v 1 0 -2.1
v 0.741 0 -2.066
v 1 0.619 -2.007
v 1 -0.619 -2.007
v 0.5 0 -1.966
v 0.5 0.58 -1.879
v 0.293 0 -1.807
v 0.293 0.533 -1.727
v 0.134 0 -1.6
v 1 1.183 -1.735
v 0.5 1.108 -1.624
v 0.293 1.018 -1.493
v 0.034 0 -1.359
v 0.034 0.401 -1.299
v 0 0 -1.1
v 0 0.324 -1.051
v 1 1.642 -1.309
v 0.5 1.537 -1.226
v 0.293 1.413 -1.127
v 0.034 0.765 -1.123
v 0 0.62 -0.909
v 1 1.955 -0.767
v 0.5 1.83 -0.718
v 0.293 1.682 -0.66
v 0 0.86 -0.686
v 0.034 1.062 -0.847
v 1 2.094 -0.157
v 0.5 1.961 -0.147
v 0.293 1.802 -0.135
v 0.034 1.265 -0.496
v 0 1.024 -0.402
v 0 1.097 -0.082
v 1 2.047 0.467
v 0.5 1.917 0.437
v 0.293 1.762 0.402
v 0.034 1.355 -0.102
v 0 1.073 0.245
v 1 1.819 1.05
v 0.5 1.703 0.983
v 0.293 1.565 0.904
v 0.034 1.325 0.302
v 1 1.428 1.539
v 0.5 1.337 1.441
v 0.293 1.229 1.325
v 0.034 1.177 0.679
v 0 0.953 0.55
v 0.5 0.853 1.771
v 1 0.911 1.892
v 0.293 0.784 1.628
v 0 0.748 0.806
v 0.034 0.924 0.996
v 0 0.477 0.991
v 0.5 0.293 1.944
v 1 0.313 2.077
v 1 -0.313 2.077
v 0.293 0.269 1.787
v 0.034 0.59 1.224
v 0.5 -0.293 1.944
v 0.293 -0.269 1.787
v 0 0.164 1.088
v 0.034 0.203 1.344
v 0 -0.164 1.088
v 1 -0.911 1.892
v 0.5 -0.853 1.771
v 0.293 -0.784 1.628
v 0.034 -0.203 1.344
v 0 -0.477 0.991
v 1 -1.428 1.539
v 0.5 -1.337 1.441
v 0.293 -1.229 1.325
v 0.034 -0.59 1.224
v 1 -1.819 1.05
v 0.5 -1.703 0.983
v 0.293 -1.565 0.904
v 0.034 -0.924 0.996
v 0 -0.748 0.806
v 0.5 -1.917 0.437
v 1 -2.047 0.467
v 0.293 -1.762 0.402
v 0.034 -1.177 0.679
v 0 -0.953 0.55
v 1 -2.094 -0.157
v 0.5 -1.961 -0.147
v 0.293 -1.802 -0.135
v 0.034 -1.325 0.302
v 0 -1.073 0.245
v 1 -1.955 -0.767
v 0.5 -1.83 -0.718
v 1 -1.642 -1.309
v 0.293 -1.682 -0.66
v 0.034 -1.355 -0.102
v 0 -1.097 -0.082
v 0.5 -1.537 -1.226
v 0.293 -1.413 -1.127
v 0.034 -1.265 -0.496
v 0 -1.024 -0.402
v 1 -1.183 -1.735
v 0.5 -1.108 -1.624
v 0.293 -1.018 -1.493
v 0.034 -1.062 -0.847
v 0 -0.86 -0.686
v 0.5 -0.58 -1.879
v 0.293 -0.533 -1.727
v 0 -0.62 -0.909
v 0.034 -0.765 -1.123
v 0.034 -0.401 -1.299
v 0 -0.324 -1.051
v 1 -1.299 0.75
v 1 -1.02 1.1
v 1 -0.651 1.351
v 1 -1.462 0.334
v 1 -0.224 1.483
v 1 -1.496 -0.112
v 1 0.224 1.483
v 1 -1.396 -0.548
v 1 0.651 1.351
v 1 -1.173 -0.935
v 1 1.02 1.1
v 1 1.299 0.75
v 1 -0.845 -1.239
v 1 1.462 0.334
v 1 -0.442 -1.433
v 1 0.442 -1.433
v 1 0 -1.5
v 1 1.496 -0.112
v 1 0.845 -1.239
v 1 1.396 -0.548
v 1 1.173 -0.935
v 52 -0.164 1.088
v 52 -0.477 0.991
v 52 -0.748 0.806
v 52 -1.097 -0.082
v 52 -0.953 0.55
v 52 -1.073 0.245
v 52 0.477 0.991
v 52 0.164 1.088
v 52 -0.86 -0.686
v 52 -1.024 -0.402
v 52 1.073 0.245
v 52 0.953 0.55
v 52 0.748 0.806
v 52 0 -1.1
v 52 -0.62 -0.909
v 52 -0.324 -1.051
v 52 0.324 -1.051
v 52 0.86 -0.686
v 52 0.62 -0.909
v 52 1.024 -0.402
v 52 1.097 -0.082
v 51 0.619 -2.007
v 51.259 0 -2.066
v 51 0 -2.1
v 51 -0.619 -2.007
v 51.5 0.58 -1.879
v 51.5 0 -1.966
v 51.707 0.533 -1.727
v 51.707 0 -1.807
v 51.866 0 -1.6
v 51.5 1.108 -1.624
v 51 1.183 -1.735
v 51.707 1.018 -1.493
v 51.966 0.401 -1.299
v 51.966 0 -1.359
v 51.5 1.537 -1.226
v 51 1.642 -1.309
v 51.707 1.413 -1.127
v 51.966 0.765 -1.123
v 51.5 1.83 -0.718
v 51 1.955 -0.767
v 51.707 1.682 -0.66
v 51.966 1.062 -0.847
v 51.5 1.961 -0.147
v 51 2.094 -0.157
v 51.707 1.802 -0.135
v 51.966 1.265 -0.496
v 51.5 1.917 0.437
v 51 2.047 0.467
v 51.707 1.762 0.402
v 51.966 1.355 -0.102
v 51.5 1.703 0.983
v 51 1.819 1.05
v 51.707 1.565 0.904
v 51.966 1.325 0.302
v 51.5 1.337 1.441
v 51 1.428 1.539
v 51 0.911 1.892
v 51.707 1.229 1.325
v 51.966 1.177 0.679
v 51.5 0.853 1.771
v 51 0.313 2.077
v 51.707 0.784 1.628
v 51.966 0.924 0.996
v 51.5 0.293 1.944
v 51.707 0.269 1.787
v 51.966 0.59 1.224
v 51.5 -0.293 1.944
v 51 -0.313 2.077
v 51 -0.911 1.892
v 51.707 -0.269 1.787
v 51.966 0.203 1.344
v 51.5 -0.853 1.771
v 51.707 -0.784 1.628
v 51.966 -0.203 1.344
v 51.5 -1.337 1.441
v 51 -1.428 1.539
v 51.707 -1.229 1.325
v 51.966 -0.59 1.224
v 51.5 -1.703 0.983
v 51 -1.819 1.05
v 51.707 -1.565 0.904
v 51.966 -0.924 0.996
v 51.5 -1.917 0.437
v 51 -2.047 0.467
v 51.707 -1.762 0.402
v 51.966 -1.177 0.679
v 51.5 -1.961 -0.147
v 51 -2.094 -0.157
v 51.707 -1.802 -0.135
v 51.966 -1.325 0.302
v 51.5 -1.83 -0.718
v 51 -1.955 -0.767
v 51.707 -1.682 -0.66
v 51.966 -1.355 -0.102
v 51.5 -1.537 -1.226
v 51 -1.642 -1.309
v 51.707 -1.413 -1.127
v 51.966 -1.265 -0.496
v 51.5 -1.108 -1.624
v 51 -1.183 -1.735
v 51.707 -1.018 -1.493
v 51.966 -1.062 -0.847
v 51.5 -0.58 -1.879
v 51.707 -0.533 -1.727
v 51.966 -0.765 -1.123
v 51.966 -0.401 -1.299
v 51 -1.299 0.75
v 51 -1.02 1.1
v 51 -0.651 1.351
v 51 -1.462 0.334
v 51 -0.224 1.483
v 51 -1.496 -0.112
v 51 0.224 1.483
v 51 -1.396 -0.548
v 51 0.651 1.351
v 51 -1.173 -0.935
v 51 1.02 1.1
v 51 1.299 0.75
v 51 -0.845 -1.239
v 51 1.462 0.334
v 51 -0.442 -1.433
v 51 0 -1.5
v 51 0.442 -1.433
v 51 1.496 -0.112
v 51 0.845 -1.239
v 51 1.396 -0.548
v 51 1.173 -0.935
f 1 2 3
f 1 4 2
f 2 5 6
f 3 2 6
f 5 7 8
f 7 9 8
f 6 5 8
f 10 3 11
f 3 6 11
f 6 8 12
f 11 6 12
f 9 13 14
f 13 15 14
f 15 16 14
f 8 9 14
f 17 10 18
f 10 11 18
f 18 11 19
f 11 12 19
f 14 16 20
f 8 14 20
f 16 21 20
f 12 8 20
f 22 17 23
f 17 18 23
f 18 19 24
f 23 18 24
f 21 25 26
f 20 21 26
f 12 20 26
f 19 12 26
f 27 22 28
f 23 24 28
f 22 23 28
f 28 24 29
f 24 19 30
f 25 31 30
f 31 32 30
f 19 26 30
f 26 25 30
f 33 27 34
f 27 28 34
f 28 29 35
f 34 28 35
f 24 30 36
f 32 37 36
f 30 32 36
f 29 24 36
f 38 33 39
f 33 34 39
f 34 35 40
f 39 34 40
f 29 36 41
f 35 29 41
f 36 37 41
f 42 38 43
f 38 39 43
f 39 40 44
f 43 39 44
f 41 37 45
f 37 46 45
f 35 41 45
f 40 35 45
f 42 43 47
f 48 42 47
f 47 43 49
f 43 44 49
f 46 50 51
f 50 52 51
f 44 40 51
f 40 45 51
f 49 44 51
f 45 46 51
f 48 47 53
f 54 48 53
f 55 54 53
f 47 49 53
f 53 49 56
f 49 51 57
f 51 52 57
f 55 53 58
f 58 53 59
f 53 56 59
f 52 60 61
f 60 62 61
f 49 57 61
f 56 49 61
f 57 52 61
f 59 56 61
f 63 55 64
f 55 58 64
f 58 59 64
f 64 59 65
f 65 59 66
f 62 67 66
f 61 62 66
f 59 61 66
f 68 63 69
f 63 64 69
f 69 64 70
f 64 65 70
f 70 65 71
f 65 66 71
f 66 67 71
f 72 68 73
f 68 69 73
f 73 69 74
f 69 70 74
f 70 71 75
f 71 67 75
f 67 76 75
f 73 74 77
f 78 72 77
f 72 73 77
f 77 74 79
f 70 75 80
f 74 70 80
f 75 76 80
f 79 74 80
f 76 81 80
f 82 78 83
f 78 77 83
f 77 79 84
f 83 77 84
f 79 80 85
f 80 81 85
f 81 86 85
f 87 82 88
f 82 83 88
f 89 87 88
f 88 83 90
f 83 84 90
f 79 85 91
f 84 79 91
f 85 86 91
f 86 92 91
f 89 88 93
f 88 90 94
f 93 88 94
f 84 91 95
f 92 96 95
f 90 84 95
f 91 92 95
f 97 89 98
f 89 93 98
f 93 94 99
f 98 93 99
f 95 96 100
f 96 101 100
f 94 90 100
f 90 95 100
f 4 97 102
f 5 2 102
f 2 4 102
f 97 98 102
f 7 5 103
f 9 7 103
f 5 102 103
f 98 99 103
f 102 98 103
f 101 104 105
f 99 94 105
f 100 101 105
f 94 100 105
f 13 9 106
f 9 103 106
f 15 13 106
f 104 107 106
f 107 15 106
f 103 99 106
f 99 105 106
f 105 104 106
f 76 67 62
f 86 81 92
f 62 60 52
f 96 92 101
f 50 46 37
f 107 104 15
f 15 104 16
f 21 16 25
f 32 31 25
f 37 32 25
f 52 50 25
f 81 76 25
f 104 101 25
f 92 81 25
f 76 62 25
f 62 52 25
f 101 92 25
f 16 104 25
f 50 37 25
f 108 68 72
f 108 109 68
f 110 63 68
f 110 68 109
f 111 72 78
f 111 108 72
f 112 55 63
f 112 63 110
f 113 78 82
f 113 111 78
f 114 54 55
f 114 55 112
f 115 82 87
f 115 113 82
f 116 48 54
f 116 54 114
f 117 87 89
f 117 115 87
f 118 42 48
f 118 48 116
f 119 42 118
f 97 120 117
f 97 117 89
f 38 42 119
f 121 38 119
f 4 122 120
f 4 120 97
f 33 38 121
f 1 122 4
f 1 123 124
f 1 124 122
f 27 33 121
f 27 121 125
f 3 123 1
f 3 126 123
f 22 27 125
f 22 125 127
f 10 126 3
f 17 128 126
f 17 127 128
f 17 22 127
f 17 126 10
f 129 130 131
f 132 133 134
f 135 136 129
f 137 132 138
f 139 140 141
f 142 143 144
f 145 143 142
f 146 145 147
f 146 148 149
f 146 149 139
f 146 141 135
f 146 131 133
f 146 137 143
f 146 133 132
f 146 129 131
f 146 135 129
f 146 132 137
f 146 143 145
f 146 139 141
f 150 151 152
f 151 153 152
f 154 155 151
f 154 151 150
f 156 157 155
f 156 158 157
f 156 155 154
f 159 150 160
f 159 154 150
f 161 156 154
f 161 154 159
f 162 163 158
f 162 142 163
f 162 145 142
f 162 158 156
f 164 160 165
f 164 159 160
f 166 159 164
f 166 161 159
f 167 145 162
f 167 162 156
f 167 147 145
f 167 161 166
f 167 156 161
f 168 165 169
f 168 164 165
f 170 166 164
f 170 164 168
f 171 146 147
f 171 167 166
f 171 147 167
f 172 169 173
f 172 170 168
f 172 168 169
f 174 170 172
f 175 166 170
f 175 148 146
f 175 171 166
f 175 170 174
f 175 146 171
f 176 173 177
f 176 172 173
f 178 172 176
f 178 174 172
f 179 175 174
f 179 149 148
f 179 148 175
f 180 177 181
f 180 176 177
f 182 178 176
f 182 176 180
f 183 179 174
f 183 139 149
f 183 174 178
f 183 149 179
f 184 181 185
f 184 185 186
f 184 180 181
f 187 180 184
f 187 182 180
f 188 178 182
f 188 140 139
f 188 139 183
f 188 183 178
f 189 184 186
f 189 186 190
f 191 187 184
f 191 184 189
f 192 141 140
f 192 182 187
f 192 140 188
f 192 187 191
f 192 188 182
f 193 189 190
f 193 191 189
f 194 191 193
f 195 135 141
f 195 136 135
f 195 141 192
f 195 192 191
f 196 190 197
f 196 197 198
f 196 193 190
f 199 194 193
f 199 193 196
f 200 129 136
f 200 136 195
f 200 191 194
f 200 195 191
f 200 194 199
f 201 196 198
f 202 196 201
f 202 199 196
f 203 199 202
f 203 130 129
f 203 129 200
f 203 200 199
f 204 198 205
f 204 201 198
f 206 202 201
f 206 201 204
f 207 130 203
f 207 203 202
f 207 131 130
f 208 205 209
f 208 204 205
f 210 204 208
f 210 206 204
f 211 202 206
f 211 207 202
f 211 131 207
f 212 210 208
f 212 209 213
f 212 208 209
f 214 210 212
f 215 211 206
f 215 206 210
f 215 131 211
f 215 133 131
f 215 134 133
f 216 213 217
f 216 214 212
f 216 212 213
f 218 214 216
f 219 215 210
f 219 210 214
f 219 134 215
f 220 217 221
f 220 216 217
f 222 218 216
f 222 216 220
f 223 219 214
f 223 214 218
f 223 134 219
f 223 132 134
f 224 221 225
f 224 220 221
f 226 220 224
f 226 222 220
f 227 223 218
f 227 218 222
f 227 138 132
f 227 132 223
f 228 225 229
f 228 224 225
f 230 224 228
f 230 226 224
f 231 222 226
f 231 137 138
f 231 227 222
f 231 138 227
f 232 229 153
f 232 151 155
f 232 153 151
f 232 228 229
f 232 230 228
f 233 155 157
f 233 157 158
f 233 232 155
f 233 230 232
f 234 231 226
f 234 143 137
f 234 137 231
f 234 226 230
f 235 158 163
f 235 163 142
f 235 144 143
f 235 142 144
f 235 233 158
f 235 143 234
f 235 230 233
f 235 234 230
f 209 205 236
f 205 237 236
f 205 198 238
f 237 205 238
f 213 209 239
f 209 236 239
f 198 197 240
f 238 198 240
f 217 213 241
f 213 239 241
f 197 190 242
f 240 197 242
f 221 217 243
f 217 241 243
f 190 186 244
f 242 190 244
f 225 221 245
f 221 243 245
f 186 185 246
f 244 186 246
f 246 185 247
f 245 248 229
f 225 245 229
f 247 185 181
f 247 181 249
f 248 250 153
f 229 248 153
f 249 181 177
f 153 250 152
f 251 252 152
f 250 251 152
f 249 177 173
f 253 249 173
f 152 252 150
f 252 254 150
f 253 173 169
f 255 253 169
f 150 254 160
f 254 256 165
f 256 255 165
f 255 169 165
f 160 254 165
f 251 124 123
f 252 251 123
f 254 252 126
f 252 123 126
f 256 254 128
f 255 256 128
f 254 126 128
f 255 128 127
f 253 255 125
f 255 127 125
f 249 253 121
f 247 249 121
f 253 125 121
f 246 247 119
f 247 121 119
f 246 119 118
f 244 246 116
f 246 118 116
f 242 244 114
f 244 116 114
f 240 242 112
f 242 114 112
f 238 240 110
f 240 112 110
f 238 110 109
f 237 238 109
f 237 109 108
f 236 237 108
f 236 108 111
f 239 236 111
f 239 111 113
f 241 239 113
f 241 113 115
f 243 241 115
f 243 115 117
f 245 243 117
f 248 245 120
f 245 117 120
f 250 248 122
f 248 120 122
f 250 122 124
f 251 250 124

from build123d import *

# Parameters (mm, degrees)
SKETCH1_R           = 2.1
BOSS_EXTRUDE1_DEPTH = 1
SKETCH2_R           = 1.5
BOSS_EXTRUDE2_DEPTH = 50
SKETCH3_R           = 2.1
BOSS_EXTRUDE3_DEPTH = 1
FILLET1_R           = 1


with BuildPart() as part:
    # Sketch1 → Boss-Extrude1 (new body)
    with BuildSketch(Plane(origin=(0, 0, 0), x_dir=(0, 0, -1), z_dir=(1, 0, 0))):
        Circle(SKETCH1_R)
    extrude(amount=BOSS_EXTRUDE1_DEPTH)

    # Sketch2 → Boss-Extrude2 (add)
    with BuildSketch(Plane(origin=(1, 0, 0), x_dir=(0, 0, -1), z_dir=(1, 0, 0))):
        Circle(SKETCH2_R)
    extrude(amount=BOSS_EXTRUDE2_DEPTH)

    # Sketch3 → Boss-Extrude3 (add)
    with BuildSketch(Plane(origin=(51, 0, 0), x_dir=(0, 0, -1), z_dir=(1, 0, 0))):
        Circle(SKETCH3_R)
    extrude(amount=BOSS_EXTRUDE3_DEPTH)

    # Fillet1
    fillet1_edges = [part.edges().sort_by_distance(p)[0] for p in [
        (0, 0, 2.1),
        (52, 0, 2.1),
    ]]
    fillet(fillet1_edges, radius=FILLET1_R - 0.0001)  # a hair under: the kernel refuses the full size


solid = part.part
